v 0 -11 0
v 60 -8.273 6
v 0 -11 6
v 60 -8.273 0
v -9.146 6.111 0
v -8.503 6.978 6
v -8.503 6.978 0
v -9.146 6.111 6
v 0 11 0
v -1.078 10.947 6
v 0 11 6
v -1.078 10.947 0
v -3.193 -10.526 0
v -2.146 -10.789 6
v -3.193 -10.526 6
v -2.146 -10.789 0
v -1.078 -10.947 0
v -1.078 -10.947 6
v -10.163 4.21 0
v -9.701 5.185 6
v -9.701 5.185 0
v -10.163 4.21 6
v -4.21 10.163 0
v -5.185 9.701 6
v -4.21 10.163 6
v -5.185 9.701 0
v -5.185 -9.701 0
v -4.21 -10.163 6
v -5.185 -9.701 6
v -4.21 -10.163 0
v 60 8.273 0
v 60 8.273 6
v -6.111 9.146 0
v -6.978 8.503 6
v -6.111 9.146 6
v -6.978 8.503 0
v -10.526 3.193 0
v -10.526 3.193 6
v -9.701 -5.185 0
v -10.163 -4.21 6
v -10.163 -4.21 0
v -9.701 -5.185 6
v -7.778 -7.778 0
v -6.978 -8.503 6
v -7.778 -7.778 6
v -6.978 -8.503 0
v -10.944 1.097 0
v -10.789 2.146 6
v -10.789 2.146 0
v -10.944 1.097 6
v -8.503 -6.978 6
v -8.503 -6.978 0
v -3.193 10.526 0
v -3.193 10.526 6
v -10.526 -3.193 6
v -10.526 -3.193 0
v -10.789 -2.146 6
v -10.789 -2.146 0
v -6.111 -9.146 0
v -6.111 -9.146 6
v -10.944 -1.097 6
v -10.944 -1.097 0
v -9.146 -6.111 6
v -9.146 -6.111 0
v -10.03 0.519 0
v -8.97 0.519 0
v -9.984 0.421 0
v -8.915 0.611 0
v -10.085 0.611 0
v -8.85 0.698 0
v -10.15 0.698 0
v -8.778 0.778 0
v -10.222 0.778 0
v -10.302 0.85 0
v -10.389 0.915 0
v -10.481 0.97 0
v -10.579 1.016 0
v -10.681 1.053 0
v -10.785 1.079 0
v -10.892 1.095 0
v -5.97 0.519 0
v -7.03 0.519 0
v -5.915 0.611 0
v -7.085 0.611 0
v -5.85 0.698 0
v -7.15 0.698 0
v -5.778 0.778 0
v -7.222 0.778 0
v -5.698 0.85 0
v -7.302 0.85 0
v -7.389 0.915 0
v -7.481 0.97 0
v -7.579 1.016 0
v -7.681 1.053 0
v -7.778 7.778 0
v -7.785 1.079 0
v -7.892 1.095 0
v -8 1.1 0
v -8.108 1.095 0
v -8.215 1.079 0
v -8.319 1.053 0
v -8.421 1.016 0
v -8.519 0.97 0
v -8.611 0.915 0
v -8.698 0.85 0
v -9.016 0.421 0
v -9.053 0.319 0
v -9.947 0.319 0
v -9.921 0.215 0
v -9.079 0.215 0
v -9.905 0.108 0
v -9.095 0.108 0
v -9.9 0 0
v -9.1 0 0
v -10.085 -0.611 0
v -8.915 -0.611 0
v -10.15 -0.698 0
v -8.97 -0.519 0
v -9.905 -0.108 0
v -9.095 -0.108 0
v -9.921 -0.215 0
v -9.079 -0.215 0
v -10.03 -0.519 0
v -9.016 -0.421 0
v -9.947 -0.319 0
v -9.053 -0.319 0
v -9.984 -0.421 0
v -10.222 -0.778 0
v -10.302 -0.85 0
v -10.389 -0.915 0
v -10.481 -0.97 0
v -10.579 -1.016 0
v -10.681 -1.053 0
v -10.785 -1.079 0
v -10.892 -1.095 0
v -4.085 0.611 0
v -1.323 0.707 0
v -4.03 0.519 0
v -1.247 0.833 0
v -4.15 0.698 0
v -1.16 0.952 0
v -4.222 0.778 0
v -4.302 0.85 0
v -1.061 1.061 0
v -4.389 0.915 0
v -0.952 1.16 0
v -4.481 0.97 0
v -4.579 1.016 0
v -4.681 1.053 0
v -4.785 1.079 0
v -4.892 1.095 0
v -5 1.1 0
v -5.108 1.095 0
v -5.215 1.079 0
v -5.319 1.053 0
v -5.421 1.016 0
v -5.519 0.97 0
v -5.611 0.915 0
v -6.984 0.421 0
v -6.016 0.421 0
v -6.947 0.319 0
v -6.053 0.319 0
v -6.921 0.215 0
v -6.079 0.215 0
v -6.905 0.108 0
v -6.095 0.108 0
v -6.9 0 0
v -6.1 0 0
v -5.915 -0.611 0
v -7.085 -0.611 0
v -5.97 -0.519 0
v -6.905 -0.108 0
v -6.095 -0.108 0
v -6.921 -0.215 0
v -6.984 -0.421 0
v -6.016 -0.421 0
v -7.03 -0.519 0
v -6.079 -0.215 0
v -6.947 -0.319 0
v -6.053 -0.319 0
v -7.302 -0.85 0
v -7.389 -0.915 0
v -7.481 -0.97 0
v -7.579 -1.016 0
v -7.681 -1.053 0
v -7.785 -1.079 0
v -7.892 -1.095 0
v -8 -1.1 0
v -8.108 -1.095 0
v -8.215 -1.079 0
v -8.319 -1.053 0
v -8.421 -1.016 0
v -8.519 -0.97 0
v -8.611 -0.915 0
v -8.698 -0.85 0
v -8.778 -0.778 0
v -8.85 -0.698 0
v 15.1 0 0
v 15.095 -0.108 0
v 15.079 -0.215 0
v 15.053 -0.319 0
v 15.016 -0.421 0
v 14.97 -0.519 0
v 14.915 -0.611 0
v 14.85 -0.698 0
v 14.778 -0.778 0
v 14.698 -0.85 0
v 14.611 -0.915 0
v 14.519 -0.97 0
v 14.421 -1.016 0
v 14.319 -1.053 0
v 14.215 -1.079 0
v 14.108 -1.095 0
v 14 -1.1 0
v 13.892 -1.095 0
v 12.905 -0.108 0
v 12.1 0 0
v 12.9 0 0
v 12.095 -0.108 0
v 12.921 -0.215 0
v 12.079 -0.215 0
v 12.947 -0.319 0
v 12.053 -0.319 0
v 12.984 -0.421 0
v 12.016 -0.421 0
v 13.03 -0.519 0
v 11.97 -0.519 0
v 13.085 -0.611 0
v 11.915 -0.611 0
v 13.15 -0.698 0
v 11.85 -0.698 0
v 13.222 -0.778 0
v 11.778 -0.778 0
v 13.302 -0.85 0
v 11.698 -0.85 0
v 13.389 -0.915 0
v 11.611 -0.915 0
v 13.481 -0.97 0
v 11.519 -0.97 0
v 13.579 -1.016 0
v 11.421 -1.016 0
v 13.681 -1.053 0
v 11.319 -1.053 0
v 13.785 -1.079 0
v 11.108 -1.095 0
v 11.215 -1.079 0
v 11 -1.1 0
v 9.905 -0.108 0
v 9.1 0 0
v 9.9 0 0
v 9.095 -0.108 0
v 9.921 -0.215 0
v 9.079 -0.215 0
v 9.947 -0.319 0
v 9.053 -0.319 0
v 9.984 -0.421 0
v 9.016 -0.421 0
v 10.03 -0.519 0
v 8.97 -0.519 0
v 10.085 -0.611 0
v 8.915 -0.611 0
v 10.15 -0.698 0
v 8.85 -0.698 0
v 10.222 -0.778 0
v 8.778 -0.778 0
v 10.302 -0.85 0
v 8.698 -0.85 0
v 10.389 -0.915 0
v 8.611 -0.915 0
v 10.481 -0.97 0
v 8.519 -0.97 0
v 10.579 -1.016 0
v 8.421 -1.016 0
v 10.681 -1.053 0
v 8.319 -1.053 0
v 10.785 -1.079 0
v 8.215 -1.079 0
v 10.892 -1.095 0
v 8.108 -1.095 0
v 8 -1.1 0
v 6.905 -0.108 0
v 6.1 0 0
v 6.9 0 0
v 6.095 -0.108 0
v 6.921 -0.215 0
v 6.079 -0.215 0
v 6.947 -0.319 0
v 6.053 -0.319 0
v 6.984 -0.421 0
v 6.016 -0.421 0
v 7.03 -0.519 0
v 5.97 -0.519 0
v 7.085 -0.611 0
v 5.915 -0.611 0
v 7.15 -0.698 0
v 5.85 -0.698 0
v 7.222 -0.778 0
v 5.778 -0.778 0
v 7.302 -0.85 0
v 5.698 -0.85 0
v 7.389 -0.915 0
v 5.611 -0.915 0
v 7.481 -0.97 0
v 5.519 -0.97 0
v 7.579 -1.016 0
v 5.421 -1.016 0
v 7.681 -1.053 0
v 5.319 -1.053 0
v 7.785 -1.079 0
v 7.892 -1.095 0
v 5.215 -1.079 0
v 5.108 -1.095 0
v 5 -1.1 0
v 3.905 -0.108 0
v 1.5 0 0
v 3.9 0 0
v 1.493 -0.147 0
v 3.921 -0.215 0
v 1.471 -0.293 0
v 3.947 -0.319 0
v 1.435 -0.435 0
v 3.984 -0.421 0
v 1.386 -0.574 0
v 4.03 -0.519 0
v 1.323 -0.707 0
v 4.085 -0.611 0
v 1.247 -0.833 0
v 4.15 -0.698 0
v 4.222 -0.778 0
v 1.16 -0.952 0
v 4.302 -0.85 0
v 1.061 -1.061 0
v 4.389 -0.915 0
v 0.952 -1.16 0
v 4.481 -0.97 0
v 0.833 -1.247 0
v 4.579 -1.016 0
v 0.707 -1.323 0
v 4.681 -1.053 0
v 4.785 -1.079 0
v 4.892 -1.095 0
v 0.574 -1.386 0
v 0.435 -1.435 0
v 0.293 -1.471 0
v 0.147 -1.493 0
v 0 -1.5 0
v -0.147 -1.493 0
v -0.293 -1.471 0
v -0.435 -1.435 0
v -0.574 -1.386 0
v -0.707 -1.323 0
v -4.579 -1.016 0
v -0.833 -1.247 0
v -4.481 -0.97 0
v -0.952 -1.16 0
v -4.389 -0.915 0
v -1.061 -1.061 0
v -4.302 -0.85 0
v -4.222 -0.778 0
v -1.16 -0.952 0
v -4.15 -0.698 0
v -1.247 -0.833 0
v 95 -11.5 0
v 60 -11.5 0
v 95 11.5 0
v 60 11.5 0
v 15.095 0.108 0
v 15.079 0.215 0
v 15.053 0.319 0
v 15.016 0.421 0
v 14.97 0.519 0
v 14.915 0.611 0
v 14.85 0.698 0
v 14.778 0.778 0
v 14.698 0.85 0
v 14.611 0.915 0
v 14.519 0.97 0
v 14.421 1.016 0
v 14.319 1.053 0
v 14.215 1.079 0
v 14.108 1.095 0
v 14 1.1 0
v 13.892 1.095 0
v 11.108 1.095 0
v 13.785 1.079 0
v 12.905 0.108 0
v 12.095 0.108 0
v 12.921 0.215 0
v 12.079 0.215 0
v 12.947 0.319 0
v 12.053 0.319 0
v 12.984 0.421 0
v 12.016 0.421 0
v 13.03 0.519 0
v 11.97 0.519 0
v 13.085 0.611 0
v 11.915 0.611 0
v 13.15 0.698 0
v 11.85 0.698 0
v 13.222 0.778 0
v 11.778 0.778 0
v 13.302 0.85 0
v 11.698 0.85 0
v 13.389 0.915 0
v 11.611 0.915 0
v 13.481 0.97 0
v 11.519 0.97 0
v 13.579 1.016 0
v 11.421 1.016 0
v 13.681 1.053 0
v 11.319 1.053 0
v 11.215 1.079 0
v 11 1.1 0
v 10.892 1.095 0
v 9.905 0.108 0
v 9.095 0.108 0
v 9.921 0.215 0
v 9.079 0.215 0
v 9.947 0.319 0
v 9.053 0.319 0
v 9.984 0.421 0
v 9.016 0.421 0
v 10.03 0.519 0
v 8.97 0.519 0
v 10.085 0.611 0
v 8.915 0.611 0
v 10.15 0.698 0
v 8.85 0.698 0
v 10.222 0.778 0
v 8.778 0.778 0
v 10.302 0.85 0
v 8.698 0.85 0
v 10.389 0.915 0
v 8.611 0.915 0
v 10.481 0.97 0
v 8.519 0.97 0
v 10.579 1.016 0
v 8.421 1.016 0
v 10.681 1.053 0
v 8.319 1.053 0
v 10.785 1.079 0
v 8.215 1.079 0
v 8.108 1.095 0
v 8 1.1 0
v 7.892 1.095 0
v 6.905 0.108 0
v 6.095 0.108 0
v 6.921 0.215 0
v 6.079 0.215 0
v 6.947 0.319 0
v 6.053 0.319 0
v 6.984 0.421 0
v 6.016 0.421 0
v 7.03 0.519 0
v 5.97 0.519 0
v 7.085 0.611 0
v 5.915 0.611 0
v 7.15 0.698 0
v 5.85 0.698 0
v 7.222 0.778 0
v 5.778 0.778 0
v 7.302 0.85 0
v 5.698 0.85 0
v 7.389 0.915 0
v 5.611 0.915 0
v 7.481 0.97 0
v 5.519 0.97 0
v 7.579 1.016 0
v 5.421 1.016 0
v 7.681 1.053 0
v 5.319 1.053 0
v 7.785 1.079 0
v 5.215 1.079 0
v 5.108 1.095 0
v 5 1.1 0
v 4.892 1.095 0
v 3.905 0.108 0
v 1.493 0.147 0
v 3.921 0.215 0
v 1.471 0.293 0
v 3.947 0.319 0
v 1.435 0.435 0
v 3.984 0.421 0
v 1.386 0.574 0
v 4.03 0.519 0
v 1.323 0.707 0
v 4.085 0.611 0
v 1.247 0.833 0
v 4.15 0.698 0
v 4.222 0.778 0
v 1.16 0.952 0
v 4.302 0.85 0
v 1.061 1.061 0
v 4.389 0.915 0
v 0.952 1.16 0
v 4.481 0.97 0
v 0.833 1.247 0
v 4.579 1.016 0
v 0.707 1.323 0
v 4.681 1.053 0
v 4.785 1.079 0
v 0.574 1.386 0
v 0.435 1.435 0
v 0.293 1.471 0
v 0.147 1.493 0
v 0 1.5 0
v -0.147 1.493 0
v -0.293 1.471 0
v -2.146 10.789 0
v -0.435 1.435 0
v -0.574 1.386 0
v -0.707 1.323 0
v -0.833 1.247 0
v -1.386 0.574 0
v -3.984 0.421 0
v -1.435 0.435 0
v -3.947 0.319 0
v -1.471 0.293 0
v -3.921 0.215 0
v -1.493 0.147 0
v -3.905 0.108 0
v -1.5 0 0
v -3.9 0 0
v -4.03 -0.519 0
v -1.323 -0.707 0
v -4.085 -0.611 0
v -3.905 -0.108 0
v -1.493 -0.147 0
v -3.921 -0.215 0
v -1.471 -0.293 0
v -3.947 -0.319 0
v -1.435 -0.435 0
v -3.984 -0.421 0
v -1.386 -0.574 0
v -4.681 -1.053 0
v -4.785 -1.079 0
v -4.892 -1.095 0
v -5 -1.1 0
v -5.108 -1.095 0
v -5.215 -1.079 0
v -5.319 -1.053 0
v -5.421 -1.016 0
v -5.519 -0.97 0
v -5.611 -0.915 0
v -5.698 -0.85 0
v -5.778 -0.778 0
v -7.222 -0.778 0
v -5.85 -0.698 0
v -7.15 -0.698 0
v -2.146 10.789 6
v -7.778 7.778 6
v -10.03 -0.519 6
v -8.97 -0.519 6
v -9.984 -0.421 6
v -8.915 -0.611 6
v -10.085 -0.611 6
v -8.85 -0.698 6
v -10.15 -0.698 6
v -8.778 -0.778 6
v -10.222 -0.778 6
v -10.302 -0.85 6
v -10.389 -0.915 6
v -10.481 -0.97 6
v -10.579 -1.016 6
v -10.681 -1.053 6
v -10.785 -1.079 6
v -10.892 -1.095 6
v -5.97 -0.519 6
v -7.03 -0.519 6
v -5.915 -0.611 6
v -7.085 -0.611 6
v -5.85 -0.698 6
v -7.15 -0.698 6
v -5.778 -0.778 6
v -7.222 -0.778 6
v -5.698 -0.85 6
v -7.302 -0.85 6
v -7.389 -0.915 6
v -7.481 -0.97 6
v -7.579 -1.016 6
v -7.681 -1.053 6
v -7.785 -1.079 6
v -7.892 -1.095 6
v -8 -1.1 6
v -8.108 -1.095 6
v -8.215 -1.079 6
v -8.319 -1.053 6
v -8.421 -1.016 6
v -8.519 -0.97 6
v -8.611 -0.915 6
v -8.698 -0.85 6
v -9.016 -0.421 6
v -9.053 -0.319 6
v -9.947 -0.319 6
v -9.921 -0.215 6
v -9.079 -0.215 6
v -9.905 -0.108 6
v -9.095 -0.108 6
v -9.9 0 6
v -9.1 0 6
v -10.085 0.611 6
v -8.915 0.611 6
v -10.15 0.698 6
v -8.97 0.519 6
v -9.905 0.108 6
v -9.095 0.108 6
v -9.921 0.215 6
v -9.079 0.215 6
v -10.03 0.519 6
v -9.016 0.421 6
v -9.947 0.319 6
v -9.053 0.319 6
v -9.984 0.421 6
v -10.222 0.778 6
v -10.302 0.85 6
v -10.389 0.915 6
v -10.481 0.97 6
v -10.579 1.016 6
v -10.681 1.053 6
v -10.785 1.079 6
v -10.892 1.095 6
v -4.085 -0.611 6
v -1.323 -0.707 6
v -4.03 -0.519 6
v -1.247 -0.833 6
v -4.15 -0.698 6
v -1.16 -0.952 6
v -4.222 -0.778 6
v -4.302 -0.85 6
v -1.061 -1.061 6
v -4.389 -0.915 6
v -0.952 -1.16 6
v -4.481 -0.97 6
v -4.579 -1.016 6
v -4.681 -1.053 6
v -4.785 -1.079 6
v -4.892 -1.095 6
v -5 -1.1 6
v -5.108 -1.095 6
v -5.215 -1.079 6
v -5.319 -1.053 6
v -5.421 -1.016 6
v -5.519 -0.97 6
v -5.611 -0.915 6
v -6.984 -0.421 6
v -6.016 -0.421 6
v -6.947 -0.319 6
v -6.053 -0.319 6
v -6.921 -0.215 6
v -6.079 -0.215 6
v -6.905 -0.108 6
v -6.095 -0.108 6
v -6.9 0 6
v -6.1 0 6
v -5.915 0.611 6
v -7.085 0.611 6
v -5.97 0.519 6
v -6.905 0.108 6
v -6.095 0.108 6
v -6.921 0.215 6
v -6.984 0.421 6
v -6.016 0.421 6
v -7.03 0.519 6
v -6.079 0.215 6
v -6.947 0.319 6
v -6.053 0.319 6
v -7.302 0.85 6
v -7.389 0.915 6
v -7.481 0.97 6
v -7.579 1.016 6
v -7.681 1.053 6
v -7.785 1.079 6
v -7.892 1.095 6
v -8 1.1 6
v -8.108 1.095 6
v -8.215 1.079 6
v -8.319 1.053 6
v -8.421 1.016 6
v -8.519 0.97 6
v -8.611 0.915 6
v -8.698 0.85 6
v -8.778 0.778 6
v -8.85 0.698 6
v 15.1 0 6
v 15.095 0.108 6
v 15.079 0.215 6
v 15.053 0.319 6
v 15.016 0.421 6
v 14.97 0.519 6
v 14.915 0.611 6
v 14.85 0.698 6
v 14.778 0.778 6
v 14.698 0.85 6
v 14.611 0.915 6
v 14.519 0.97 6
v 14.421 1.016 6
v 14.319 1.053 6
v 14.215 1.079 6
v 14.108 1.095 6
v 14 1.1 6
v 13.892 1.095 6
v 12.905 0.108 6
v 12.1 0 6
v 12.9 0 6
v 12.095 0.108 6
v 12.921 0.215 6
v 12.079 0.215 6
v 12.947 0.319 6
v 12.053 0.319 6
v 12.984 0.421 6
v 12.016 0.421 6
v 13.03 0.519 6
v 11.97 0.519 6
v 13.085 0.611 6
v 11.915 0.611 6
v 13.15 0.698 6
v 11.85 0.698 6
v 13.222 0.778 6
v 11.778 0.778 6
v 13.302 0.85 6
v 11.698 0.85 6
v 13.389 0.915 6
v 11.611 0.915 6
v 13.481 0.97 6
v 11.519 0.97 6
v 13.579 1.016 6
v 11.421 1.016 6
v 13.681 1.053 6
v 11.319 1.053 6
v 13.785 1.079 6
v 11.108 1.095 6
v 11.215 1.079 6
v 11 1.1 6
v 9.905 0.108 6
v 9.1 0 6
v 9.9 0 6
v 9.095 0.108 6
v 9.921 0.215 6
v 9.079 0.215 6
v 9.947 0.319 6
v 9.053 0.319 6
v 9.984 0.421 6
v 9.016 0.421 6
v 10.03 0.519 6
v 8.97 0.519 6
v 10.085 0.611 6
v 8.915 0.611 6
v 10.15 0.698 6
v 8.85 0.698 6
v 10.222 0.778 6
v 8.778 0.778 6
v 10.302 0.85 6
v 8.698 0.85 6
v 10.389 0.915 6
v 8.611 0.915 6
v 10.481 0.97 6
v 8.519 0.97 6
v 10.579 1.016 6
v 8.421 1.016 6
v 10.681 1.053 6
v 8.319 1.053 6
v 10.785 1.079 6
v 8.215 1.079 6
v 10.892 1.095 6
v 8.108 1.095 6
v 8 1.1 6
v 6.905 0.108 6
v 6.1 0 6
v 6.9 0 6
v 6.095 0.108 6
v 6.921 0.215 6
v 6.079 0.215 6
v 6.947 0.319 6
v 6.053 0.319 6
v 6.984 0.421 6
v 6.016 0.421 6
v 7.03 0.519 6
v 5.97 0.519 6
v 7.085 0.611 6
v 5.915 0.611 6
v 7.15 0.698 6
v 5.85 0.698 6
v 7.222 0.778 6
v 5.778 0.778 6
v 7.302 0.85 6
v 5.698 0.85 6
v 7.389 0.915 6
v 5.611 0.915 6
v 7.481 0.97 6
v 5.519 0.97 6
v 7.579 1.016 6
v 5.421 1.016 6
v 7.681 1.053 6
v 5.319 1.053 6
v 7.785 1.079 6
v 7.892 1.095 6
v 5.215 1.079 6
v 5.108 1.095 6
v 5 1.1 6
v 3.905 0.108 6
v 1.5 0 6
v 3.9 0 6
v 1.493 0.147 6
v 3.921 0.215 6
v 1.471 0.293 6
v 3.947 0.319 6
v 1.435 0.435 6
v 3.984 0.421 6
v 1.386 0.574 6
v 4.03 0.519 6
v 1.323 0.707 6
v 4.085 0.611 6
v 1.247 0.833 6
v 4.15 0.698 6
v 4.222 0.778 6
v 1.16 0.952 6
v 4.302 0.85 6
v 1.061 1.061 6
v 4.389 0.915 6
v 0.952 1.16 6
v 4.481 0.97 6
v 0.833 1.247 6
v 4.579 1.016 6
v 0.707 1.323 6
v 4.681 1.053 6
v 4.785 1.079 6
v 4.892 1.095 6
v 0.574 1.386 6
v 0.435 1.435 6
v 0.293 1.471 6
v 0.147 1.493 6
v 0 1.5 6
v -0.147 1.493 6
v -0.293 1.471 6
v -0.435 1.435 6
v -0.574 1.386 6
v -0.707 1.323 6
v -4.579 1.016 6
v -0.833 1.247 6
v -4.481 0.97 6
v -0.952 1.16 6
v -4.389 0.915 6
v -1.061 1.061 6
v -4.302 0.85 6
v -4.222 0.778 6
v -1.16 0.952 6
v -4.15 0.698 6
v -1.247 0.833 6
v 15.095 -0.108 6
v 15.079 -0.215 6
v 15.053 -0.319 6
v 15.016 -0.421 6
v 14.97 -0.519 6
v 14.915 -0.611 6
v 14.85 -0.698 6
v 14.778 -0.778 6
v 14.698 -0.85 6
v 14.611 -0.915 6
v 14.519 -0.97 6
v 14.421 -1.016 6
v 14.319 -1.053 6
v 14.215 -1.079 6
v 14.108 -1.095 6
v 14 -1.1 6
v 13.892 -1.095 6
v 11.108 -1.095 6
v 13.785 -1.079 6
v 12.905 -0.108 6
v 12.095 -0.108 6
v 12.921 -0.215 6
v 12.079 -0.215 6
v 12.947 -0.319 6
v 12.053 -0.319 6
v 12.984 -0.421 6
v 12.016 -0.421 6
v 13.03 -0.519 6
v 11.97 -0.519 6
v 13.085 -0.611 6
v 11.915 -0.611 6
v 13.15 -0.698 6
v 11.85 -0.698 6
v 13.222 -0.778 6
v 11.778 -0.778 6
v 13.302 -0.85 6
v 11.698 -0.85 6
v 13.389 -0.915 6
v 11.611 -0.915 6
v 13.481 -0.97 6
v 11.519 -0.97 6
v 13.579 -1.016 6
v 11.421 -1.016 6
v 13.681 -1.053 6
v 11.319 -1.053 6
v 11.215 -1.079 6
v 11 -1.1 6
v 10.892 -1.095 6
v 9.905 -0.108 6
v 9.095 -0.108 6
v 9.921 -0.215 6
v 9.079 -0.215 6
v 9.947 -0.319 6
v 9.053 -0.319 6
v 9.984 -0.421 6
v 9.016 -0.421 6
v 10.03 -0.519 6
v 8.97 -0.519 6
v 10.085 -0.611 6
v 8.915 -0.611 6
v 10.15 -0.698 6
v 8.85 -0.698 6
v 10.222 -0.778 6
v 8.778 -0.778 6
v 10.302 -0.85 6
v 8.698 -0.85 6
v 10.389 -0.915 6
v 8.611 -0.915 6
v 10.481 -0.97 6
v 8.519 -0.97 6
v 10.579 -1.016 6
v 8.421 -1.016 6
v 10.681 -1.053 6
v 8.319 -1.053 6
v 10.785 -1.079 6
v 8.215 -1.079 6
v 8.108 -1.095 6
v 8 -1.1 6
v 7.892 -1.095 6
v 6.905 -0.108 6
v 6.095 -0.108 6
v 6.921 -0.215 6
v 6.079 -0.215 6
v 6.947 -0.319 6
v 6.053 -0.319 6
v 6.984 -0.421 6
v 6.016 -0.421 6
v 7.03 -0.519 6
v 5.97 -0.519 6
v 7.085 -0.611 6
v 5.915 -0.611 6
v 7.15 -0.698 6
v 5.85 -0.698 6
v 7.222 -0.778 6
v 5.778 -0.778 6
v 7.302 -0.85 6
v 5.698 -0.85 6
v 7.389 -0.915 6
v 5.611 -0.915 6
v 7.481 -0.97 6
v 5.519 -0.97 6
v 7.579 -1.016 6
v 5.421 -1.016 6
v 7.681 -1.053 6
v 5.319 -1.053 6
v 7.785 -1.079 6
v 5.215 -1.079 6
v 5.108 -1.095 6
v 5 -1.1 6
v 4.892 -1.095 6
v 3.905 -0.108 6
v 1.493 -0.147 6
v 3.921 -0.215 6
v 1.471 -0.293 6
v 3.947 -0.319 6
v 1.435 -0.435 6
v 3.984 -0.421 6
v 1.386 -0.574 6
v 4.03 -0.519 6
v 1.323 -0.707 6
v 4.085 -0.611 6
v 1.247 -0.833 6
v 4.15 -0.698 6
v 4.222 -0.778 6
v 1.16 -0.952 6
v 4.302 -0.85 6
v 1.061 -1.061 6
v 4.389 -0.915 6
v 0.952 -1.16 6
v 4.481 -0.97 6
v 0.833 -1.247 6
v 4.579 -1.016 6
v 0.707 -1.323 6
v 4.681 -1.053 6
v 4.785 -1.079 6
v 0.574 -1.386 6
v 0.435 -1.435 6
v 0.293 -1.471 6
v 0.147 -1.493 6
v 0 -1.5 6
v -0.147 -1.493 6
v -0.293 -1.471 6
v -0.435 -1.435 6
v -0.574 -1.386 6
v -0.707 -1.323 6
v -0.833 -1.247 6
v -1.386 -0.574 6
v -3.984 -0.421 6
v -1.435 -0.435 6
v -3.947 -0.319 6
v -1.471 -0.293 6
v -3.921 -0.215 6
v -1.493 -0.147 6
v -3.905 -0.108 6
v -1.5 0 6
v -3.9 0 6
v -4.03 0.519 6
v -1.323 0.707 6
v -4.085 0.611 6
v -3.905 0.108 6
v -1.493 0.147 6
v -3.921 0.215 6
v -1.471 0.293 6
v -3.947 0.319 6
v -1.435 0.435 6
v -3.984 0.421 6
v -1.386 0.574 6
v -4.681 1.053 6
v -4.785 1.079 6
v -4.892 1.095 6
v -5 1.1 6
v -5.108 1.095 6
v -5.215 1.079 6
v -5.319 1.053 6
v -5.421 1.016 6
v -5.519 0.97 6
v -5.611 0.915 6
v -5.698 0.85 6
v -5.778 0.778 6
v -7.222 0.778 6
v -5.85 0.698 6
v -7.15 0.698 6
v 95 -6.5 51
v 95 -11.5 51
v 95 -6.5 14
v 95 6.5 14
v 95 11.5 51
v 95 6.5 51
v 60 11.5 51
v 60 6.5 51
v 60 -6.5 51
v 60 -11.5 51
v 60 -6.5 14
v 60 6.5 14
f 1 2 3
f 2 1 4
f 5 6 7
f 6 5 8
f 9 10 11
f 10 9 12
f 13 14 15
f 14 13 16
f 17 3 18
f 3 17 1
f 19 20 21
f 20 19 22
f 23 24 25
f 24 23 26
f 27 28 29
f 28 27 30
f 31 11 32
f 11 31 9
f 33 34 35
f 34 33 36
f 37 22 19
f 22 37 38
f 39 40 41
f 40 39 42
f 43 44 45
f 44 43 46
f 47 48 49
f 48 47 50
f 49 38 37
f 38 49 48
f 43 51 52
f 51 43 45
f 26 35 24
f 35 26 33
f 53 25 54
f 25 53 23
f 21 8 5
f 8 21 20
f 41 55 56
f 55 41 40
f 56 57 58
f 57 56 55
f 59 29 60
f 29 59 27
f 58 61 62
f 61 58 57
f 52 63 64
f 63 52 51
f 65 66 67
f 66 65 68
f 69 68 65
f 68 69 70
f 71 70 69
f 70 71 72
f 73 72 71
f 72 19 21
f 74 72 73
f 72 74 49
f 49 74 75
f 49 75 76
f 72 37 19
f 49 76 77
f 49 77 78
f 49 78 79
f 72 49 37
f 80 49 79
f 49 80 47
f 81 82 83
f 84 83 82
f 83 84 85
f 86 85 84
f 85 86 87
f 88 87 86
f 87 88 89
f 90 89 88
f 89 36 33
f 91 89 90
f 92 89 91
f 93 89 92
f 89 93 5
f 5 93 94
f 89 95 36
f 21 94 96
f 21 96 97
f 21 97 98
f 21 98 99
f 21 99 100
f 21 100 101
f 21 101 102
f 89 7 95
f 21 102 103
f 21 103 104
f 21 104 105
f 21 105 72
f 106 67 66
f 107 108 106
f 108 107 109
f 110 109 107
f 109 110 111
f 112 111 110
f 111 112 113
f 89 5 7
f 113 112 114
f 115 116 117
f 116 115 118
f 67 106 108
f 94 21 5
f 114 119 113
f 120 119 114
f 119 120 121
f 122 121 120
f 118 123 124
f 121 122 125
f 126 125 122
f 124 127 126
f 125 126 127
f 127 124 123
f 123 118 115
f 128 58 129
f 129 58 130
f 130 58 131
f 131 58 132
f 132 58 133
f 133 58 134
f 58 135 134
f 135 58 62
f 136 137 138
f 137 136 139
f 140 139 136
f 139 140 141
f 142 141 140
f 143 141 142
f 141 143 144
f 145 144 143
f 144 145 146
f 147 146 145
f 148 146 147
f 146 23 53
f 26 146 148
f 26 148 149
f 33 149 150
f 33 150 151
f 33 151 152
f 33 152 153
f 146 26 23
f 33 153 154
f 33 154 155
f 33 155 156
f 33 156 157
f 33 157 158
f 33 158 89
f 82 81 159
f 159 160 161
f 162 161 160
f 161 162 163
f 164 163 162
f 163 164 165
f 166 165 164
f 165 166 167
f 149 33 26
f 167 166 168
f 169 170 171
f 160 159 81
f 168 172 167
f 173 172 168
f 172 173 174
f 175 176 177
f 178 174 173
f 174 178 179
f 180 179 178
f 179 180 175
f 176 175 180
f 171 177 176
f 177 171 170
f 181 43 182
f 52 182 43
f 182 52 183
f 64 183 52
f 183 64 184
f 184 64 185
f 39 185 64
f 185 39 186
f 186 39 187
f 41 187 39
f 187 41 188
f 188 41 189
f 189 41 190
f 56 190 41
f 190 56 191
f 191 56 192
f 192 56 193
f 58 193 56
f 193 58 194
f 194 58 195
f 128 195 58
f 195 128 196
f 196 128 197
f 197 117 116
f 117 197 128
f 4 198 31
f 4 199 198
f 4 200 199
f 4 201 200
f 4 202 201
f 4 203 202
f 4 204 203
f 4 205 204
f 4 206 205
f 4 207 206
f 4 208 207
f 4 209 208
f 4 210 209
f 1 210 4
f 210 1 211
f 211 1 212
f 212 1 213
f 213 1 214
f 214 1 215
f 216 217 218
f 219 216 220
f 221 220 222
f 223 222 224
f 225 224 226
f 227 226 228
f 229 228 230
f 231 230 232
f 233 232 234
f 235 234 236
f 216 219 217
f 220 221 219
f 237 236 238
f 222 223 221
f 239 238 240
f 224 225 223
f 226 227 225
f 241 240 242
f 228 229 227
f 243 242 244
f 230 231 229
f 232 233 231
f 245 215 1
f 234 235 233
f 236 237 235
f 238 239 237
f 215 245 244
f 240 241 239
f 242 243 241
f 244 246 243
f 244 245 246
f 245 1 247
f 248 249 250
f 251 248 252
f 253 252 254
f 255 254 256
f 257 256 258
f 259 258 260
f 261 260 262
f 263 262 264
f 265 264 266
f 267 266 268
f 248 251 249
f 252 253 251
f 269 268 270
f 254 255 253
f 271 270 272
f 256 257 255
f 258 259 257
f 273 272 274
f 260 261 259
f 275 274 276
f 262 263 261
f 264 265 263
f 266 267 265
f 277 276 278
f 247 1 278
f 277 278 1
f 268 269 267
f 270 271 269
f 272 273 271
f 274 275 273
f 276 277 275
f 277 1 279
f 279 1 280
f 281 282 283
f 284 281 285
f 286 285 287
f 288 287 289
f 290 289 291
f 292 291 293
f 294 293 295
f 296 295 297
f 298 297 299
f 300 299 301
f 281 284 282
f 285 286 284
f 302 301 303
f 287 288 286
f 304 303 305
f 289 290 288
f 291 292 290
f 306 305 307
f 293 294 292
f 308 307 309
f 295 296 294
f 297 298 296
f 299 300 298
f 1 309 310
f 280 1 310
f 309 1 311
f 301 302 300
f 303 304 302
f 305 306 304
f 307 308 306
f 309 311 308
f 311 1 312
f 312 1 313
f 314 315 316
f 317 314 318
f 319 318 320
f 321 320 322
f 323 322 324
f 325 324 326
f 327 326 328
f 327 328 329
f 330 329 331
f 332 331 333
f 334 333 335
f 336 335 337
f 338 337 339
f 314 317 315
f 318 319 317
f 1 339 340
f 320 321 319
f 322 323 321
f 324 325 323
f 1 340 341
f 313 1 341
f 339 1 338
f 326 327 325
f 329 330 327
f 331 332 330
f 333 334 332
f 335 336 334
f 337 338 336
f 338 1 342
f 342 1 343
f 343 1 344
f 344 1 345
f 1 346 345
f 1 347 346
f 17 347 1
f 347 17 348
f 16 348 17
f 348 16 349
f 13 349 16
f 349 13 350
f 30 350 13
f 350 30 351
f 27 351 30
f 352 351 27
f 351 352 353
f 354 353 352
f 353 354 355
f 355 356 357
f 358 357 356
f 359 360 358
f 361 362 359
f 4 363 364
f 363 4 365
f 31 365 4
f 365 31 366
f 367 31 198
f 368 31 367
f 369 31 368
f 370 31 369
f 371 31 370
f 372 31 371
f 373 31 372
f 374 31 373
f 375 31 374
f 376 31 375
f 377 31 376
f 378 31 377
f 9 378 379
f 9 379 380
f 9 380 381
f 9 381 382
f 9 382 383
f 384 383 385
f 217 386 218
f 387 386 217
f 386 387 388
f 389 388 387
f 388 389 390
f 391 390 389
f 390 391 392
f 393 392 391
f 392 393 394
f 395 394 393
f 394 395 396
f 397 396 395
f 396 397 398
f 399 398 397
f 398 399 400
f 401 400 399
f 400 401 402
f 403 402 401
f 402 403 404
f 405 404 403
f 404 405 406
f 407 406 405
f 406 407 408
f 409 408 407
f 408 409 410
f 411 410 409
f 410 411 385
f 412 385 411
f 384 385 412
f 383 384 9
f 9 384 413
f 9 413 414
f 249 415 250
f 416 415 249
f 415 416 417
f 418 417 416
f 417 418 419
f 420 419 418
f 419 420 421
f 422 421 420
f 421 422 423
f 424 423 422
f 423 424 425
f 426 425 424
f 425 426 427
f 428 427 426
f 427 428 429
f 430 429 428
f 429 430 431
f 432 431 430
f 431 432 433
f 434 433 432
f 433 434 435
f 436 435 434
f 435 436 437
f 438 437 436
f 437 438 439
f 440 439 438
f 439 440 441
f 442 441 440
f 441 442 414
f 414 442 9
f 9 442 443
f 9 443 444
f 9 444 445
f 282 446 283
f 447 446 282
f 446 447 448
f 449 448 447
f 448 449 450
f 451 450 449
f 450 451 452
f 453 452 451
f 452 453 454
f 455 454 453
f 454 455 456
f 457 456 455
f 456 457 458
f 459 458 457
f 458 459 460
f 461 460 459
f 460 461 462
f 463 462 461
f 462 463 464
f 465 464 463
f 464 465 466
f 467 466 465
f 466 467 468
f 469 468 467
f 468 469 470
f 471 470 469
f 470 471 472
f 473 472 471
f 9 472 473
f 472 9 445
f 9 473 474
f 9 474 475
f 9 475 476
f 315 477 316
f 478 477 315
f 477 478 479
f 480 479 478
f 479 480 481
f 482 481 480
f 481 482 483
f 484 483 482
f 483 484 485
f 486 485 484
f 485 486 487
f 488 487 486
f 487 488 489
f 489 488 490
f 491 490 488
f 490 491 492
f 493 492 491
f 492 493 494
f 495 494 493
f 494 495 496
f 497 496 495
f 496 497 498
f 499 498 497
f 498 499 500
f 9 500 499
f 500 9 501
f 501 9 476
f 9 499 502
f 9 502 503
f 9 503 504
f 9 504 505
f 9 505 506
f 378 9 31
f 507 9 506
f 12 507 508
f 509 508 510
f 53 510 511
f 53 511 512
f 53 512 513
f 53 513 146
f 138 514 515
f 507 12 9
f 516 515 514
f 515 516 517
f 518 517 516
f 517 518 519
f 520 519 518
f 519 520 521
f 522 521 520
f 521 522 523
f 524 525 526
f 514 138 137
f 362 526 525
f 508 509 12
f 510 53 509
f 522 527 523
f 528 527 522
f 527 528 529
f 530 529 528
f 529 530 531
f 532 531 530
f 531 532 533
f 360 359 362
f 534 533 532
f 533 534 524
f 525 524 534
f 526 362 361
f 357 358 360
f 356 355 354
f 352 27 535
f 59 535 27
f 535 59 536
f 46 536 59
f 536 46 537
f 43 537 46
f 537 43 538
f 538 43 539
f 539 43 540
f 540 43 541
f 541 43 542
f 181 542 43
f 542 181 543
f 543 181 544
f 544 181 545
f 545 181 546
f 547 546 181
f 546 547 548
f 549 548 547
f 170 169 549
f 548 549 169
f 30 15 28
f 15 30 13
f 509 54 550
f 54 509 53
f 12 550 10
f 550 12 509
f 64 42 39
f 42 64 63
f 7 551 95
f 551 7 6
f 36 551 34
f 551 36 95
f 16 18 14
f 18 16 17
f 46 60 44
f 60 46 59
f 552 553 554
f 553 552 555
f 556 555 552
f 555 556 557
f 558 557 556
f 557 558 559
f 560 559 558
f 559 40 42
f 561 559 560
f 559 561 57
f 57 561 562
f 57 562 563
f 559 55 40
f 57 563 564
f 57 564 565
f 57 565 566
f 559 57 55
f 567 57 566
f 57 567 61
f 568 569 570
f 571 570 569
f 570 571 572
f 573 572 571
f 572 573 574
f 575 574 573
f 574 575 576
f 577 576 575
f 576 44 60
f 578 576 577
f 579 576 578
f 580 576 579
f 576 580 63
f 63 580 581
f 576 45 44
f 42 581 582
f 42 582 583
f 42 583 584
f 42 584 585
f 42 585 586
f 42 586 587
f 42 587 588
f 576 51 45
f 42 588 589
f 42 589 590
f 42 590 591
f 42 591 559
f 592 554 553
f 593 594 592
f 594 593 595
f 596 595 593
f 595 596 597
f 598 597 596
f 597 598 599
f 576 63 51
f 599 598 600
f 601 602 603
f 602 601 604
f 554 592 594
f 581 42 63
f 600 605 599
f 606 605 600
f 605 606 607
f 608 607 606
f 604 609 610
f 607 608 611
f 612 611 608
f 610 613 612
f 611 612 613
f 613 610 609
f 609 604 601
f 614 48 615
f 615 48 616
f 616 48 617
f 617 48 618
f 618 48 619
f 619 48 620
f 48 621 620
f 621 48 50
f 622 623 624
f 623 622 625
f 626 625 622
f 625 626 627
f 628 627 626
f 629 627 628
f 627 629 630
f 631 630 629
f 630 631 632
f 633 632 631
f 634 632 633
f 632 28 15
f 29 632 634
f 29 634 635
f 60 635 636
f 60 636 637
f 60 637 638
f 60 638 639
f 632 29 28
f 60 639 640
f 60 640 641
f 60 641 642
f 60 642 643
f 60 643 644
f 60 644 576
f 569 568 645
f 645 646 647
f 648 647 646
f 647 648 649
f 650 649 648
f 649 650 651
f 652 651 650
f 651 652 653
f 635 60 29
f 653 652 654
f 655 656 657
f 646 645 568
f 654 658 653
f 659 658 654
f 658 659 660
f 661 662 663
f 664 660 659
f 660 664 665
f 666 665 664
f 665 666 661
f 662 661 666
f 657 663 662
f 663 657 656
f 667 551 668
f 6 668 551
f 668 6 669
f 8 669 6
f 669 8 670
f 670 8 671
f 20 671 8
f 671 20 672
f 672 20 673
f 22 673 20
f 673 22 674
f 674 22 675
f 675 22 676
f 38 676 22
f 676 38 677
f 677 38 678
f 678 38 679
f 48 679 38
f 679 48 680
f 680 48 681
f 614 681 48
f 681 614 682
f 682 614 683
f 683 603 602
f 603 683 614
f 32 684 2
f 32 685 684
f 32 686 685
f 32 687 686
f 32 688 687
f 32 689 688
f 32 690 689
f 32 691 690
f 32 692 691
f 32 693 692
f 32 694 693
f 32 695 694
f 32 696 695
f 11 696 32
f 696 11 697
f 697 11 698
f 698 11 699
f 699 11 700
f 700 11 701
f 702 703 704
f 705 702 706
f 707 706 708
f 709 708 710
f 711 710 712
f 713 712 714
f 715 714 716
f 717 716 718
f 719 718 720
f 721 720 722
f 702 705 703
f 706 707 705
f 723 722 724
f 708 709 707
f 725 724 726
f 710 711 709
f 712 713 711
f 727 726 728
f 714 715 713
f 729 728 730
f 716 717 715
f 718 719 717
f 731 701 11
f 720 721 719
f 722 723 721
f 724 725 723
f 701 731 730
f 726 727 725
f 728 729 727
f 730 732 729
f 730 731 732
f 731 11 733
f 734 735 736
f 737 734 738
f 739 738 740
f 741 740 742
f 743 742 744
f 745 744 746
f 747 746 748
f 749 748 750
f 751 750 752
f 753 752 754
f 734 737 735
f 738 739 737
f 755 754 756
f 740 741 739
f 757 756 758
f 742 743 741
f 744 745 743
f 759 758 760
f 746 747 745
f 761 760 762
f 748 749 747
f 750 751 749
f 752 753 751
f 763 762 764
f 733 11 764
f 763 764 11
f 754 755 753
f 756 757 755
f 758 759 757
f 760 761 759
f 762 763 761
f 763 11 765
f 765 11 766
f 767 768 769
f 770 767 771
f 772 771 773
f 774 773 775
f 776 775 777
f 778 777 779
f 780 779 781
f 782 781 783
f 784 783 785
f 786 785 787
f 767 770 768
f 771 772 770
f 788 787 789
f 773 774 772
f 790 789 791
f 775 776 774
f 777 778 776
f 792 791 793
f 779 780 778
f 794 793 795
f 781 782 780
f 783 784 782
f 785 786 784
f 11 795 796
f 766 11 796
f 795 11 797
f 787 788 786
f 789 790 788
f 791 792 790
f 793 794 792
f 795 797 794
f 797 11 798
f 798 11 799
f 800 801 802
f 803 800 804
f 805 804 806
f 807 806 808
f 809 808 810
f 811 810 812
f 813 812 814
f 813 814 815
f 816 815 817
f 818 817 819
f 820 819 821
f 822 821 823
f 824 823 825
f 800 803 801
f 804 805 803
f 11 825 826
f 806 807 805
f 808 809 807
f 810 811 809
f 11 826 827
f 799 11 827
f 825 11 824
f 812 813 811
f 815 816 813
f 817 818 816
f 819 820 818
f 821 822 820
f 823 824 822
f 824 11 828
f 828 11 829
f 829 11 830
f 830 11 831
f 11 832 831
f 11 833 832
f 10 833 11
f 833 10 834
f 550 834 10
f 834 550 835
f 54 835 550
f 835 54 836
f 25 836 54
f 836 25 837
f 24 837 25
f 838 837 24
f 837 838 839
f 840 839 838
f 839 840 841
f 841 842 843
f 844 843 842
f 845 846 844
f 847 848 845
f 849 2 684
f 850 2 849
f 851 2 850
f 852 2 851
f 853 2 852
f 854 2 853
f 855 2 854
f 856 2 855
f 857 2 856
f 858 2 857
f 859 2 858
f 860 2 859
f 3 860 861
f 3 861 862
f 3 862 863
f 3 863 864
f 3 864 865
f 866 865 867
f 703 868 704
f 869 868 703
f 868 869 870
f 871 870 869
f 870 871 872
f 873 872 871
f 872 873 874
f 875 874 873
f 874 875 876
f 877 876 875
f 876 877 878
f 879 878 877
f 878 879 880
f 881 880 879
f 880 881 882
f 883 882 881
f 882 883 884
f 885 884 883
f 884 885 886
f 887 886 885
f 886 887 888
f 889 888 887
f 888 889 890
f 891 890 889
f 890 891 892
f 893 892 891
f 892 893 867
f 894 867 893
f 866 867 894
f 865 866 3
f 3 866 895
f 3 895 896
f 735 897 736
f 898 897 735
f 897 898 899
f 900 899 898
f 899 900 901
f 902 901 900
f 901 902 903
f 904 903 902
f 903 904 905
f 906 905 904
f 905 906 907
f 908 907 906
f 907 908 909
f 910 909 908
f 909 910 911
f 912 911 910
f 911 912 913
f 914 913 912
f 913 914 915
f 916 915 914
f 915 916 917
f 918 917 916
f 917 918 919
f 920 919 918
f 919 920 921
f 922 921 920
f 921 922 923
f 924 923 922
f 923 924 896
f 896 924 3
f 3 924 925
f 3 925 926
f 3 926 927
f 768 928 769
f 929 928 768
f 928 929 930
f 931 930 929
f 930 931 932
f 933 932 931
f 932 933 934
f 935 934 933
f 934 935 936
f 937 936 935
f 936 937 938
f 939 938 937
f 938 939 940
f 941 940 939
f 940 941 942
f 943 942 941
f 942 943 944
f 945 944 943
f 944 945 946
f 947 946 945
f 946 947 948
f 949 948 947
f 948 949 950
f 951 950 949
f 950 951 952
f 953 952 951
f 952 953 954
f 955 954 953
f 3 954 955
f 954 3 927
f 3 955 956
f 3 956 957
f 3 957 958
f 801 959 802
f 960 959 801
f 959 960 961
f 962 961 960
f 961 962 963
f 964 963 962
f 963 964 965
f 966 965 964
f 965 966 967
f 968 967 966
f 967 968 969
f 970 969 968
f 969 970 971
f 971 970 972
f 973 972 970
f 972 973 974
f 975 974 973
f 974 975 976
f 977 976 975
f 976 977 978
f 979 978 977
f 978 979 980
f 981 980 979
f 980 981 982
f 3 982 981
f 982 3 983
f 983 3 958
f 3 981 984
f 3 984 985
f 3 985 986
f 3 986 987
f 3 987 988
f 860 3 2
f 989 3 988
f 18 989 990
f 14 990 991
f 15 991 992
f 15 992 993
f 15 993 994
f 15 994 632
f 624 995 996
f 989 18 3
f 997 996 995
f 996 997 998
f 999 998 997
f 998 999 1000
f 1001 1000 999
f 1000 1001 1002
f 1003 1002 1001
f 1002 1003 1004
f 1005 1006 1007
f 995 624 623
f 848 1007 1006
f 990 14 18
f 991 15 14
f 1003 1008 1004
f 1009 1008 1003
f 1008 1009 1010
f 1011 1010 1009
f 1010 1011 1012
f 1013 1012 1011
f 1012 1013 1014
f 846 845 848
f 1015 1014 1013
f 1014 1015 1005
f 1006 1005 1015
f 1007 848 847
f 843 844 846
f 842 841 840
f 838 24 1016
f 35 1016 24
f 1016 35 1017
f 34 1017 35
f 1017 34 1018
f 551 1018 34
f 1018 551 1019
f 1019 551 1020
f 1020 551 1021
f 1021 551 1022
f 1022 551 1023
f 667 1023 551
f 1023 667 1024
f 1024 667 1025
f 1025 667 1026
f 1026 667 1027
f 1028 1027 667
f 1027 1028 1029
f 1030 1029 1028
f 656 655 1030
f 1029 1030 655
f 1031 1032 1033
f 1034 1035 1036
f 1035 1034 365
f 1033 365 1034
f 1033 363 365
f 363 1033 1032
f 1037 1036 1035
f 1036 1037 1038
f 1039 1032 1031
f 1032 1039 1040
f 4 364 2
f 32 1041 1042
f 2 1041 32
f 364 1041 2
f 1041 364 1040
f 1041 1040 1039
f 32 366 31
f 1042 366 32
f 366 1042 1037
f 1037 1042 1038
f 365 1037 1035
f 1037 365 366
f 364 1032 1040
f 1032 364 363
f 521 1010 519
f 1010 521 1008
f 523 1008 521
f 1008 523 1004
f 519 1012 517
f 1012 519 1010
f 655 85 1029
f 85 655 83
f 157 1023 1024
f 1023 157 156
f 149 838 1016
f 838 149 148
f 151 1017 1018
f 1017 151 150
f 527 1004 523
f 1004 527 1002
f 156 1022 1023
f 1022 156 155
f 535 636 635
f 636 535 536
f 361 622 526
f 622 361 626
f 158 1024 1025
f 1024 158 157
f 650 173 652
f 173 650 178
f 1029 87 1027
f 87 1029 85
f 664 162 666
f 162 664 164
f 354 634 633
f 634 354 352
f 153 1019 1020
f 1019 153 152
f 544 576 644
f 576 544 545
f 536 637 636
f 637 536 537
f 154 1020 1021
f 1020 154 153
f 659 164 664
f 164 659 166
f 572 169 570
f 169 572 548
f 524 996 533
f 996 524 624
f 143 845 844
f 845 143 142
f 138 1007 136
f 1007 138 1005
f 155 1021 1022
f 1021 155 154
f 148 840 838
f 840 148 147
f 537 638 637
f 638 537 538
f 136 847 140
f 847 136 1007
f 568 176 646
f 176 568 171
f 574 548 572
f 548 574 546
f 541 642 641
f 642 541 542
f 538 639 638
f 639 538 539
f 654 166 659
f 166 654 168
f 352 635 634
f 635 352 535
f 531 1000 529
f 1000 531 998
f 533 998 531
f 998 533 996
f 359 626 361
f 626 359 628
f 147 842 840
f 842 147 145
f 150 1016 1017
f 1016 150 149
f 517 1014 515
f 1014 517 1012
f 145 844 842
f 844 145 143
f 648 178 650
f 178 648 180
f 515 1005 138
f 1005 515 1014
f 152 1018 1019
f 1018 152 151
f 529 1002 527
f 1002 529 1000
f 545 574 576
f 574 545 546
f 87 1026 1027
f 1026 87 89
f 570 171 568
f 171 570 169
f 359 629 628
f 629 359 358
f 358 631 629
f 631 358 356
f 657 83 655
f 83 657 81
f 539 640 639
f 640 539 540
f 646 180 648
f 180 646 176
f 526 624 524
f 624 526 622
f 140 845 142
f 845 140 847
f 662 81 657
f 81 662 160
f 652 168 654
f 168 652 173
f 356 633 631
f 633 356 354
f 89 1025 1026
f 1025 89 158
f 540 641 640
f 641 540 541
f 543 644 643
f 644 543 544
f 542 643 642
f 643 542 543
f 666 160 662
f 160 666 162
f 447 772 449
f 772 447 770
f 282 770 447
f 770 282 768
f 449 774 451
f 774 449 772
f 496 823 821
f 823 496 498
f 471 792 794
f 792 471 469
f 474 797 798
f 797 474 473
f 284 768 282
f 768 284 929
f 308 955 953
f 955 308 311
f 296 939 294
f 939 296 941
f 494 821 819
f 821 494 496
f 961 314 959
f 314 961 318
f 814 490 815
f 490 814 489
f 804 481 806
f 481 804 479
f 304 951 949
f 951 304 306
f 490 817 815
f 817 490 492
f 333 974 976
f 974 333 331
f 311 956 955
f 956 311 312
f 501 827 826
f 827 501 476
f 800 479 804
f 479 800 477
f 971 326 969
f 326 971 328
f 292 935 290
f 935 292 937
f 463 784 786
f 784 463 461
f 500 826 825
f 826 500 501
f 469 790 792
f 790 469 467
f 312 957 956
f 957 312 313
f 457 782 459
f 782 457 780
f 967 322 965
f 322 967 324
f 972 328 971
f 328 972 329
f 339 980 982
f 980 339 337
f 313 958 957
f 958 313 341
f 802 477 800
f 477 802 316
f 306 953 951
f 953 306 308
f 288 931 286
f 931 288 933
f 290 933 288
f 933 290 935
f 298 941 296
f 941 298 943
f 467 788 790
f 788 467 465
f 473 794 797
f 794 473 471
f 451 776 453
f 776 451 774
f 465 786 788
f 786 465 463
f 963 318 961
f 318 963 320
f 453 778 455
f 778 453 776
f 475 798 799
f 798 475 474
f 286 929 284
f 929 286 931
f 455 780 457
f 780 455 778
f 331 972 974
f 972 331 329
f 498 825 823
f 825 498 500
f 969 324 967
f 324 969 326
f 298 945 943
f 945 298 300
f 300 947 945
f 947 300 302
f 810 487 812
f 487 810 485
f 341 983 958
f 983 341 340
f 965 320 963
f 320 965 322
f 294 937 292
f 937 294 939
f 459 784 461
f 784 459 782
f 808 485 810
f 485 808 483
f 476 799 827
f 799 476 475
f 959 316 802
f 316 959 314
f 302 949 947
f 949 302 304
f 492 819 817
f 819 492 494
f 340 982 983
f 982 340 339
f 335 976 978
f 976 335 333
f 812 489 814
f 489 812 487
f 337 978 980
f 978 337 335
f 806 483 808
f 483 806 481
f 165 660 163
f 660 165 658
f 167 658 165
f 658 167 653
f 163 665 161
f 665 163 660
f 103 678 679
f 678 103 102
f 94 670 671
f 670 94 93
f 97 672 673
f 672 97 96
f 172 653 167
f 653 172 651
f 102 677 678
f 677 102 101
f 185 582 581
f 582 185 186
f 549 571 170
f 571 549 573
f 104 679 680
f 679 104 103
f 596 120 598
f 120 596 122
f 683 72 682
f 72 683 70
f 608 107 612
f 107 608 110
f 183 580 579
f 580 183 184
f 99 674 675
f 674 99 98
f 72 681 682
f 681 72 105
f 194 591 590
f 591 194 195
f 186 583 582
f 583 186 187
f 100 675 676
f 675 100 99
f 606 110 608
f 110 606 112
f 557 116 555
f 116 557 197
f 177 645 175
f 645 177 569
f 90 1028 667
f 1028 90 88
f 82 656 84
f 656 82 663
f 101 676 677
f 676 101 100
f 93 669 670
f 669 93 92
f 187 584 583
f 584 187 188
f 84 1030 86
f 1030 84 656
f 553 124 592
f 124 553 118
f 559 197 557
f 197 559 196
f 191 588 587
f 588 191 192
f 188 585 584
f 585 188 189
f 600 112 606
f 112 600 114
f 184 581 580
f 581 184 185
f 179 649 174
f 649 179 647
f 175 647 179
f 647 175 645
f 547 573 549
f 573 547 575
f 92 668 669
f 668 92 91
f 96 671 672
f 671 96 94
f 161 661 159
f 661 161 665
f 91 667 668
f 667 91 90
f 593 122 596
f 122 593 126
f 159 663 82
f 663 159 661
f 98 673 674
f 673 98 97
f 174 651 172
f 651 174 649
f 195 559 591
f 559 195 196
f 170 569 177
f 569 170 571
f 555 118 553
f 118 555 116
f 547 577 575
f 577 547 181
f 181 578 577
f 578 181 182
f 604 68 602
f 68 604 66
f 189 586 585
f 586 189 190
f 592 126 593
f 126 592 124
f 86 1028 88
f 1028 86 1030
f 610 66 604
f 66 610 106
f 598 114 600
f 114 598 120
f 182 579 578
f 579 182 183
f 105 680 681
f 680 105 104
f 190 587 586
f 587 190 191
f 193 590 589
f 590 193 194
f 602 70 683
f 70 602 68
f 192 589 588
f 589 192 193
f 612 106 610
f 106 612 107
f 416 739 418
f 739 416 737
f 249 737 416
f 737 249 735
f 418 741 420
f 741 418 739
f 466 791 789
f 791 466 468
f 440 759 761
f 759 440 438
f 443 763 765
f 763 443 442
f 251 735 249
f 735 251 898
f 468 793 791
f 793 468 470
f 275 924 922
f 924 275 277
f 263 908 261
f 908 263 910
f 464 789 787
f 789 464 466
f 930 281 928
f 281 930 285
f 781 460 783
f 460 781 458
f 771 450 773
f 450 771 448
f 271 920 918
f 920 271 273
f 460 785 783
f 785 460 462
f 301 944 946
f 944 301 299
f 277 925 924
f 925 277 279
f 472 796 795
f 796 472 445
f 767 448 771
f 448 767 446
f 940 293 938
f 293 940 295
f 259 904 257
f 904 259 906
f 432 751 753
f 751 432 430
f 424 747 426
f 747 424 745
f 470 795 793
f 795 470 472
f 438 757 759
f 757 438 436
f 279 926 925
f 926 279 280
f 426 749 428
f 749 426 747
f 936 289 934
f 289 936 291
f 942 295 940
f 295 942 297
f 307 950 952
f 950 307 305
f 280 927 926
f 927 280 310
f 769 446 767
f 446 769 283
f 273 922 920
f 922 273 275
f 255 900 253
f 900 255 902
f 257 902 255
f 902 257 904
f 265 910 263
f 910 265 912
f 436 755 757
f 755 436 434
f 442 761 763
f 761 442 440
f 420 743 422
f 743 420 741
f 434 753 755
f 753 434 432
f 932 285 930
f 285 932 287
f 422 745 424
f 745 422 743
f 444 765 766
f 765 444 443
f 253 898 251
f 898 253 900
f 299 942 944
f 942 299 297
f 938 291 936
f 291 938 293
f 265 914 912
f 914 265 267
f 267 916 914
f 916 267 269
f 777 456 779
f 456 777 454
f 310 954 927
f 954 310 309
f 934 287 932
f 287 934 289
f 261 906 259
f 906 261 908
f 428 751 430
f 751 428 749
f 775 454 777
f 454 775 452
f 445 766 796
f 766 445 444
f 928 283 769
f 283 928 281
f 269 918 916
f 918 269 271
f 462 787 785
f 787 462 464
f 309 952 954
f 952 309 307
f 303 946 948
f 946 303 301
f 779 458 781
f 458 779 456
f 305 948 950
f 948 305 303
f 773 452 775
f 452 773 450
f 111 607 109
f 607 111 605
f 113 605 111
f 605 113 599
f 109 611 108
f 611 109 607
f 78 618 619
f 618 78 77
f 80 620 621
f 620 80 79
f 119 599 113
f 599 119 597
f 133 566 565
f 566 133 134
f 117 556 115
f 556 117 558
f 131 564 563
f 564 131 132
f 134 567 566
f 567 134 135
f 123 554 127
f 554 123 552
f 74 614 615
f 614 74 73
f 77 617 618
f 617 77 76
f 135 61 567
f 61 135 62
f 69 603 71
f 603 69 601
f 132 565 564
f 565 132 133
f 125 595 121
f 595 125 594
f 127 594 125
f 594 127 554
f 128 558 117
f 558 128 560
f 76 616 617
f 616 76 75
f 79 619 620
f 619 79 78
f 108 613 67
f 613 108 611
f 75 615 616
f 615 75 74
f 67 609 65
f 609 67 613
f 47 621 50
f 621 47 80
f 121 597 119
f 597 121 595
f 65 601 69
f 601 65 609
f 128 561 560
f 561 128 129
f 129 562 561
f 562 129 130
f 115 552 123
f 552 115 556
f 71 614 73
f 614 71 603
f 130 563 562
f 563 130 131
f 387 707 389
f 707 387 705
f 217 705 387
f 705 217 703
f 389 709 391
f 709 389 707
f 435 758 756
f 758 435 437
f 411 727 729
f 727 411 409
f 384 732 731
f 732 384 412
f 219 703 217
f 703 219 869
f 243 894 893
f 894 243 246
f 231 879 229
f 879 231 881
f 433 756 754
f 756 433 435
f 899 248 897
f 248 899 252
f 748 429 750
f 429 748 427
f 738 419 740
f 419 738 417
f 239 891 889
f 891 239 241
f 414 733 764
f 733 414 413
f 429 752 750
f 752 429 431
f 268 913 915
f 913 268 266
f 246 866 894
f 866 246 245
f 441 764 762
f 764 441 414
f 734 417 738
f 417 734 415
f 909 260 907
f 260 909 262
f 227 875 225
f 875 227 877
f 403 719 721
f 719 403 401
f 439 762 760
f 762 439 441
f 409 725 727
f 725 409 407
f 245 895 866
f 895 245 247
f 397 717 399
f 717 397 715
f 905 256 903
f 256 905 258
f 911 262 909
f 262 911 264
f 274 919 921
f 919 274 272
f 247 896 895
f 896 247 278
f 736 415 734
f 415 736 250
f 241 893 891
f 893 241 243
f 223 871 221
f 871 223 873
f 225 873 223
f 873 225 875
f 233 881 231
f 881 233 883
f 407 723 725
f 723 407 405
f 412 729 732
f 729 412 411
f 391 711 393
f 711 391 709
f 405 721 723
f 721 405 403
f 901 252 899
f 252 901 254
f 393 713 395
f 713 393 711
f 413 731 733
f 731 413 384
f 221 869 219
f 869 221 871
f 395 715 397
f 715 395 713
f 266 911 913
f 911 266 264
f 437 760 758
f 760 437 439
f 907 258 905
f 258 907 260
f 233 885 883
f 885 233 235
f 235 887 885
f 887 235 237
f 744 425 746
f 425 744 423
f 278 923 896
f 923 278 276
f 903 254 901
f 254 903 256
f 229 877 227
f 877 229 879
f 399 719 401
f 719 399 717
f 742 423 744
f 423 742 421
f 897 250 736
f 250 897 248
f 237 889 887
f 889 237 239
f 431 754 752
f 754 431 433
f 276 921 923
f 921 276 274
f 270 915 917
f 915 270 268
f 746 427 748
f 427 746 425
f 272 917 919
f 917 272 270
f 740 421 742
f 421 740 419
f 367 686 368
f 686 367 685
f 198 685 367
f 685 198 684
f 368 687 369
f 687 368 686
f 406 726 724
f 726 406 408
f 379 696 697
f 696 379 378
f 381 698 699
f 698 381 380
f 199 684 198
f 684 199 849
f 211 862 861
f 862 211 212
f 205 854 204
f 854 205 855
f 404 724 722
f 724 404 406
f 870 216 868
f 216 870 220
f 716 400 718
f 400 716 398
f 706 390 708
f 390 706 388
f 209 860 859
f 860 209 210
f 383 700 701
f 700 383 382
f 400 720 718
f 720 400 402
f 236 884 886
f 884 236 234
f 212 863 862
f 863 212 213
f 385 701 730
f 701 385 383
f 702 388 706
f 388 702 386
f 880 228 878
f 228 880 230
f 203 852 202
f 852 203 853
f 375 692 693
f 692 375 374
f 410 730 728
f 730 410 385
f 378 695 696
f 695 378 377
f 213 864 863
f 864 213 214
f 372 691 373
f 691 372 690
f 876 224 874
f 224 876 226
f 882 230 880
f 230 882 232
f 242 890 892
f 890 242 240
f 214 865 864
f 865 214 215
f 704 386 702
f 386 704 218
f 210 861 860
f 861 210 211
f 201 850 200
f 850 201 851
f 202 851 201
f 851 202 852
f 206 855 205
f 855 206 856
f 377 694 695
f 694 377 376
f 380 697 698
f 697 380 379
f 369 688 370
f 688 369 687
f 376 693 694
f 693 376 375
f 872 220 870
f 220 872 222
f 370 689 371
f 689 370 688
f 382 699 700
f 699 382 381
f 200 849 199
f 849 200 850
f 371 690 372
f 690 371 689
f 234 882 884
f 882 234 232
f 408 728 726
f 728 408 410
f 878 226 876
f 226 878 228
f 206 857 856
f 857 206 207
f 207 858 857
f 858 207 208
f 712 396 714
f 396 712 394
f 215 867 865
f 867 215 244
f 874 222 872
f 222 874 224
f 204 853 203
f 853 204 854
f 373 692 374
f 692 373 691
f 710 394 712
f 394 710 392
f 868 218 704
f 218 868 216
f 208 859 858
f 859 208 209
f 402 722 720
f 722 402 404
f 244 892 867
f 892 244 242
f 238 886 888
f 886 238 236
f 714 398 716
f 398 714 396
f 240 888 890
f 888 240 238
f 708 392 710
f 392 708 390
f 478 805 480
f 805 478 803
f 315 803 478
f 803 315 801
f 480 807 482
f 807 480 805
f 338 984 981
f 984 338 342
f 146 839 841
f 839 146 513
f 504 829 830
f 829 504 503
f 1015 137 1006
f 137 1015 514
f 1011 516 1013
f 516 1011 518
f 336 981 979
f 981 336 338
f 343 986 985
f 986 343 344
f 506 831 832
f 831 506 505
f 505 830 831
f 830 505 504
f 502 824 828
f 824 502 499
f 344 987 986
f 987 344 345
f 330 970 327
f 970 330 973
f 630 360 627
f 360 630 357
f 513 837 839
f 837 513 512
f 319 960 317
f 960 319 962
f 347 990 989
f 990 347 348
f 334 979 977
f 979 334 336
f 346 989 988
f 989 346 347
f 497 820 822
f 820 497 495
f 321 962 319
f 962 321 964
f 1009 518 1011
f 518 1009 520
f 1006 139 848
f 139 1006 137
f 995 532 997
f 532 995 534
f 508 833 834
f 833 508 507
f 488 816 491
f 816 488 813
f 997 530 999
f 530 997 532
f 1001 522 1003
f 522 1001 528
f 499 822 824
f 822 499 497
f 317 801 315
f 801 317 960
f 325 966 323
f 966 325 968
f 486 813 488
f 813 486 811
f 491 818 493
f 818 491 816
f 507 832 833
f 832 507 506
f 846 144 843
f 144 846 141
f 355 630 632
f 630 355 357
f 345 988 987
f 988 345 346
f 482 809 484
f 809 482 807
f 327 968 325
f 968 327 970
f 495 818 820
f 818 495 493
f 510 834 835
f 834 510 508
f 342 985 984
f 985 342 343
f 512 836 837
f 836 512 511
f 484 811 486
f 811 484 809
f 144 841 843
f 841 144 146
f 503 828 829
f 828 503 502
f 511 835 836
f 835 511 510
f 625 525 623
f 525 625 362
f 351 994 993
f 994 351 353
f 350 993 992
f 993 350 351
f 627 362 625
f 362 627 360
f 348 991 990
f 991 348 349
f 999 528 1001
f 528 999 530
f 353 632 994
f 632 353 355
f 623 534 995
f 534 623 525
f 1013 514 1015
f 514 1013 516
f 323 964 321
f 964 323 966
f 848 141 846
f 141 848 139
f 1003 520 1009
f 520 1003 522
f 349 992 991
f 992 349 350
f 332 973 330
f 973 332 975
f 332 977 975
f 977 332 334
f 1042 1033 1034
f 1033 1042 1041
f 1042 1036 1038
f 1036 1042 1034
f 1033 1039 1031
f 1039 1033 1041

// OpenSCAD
// FollowCam rig v2 — column-mounted servo + fork arm (from tripod photos, Aug 27)
// Mechanism: servo clamps to the center column just below the head, output shaft
// UP and next to the pan axis -> servo angle ~ pan angle (near 1:1). A printed arm
// on the servo horn ends in a U-fork that captures the handle's metal shaft and
// pushes it left/right. The open fork absorbs axis offset + the handle's downward
// angle. PLACEHOLDER DIMS — fill from cad/MEASUREMENTS.md before slicing.
//
// PART = "column_clamp" | "fork_arm"   (print one of each; 25-35% infill, no supports)

PART = "fork_arm";

/* ---------- measured on the real tripod (MEASURED Aug 27 ~21:45) ---------- */
column_d      = 15;    // MEASURED: exactly 15mm
column_free_h = 160;   // MEASURED: ~160mm free after raising elevator column
shaft_d       = 8.5;   // MEASURED: 8-9mm chrome shaft; 8.5 + slot clearance
arm_reach     = 95;    // DERIVED: 230mm to grip tip - ~140 grip - 10 = chrome mid ~80; window covers 60-95
fork_drop     = 45;    // tall prongs: huge vertical catch window (M5 not needed)
/* ---------- servo: SG90 from the Elegoo Uno kit (confirmed Aug 27) ----------
   For an MG996R upgrade set servo_l=40.7, servo_w=20.2, horn_screw_d=4.2 */
servo_l       = 23.4;  // SG90 body length + tol
servo_w       = 12.9;  // SG90 body width + tol
horn_screw_d  = 3.0;   // SG90 horn center screw clearance (M2 screw, loose)
/* ---------- tunables ---------- */
wall   = 5;
bolt_d = 3.4;          // M3 clearance
ziptie_w = 5.5; ziptie_t = 2.5;
fit_tol = 0.5;
$fn = 64;

/* --- Part 1: column clamp -------------------------------------------------
Two mirrored halves in one print, joined by M3 bolts (or zip ties) around the
column; one half carries a shelf the servo drops into, shaft up. */
module column_clamp() {
  bore_r = column_d/2 + fit_tol;
  ring_r = bore_r + wall;
  h = min(column_free_h - 5, 40);          // clamp height on the column
  shelf_l = servo_l + 2*wall;
  shelf_w = servo_w + 2*wall + 12;         // +6mm tie ledge outside each rail
  difference() {
    union() {
      cylinder(r=ring_r, h=h);                                   // ring
      // servo shelf sticking out radially (servo drops in shaft-up, flange on plate)
      translate([ring_r - 2, -shelf_w/2, 0]) cube([shelf_l, shelf_w, wall]);
      // shelf side rails to box the servo body
      for (sy = [-1, 1])
        translate([ring_r - 2, sy*(servo_w/2 + wall/2) - wall/2, 0])
          cube([shelf_l, wall, 14]);
    }
    translate([0, 0, -1]) cylinder(r=bore_r, h=h+2);             // column bore
    // split the ring: subtract a slit so it can flex closed with bolts
    translate([-ring_r-1, -1.2, -1]) cube([ring_r+1, 2.4, h+2]);
    // bolt bosses through the slit side
    for (z = [h*0.25, h*0.75])
      translate([-ring_r+wall/2, 0, z]) rotate([90, 0, 0])
        cylinder(d=bolt_d, h=3*wall, center=true);
    // servo body drop-in pocket through the shelf
    translate([ring_r - 2 + wall, -servo_w/2, -1]) cube([servo_l, servo_w, wall+16]);
    // zip-tie slots through the tie ledges (2 per side): tie loops over the
    // servo body/flange and down through these, cinching it into the pocket
    for (fx = [0.28, 0.72]) for (sy = [-1, 1])
      translate([ring_r - 2 + wall + servo_l*fx - 3,
                 sy*(servo_w/2 + wall + 3) - 1.5, -1])
        cube([6, 3, wall + 2]);
    // zip-tie tunnels around ring (backup if bolts strip)
    for (a = [60, 180, 300]) rotate([0, 0, a])
      translate([ring_r - wall/2, -ziptie_w/2, h/2 - ziptie_t/2])
        cube([wall+2, ziptie_w, ziptie_t]);
  }
}

/* --- Part 2: fork arm -----------------------------------------------------
Flat bar; one end bolts to the servo horn (center + 2 outer holes), the other
end drops down and opens into a U-fork that captures the handle shaft. */
module fork_arm() {
  bar_w = 16; bar_t = 6;
  slot_w = shaft_d + 4.5;                 // 13mm: loose on chrome, swallows early grip taper
  fork_wall = 5;
  fork_ow  = slot_w + 2*fork_wall;   // fork width (y)
  fork_len = 35;                     // fork trough length (x): rod can engage
                                     // anywhere in radius window [60,95]mm
  difference() {
    union() {
      // horn plate + main bar
      hull() {
        cylinder(d=bar_w+6, h=bar_t);
        translate([arm_reach - 30, -bar_w/2, 0]) cube([1, bar_w, bar_t]);
      }
      // long fork trough at the far end
      translate([arm_reach - fork_len, -fork_ow/2, 0])
        cube([fork_len, fork_ow, bar_t + fork_drop]);
    }
    // horn screws: center hole + a row of small holes at several radii so the
    // servo's own plastic horn can bolt/tie on whichever holes line up
    // (fits SG90 single-arm and MG996R cross horns alike)
    translate([0, 0, -1]) cylinder(d=horn_screw_d, h=bar_t+2);
    for (r = [5, 8, 11, 14]) for (sx = [-1, 1])
      translate([sx*r, 0, -1]) cylinder(d=2.2, h=bar_t+2);
    // U-slot: opens upward, runs through both x faces; deep + long slot means
    // vertical AND radial alignment are both forgiving (8mm root above bar)
    translate([arm_reach - fork_len - 1, -slot_w/2, bar_t + 8])
      cube([fork_len + 2, slot_w, fork_drop + 2]);
  }
}

if (PART == "column_clamp") column_clamp();
if (PART == "fork_arm")     fork_arm();
